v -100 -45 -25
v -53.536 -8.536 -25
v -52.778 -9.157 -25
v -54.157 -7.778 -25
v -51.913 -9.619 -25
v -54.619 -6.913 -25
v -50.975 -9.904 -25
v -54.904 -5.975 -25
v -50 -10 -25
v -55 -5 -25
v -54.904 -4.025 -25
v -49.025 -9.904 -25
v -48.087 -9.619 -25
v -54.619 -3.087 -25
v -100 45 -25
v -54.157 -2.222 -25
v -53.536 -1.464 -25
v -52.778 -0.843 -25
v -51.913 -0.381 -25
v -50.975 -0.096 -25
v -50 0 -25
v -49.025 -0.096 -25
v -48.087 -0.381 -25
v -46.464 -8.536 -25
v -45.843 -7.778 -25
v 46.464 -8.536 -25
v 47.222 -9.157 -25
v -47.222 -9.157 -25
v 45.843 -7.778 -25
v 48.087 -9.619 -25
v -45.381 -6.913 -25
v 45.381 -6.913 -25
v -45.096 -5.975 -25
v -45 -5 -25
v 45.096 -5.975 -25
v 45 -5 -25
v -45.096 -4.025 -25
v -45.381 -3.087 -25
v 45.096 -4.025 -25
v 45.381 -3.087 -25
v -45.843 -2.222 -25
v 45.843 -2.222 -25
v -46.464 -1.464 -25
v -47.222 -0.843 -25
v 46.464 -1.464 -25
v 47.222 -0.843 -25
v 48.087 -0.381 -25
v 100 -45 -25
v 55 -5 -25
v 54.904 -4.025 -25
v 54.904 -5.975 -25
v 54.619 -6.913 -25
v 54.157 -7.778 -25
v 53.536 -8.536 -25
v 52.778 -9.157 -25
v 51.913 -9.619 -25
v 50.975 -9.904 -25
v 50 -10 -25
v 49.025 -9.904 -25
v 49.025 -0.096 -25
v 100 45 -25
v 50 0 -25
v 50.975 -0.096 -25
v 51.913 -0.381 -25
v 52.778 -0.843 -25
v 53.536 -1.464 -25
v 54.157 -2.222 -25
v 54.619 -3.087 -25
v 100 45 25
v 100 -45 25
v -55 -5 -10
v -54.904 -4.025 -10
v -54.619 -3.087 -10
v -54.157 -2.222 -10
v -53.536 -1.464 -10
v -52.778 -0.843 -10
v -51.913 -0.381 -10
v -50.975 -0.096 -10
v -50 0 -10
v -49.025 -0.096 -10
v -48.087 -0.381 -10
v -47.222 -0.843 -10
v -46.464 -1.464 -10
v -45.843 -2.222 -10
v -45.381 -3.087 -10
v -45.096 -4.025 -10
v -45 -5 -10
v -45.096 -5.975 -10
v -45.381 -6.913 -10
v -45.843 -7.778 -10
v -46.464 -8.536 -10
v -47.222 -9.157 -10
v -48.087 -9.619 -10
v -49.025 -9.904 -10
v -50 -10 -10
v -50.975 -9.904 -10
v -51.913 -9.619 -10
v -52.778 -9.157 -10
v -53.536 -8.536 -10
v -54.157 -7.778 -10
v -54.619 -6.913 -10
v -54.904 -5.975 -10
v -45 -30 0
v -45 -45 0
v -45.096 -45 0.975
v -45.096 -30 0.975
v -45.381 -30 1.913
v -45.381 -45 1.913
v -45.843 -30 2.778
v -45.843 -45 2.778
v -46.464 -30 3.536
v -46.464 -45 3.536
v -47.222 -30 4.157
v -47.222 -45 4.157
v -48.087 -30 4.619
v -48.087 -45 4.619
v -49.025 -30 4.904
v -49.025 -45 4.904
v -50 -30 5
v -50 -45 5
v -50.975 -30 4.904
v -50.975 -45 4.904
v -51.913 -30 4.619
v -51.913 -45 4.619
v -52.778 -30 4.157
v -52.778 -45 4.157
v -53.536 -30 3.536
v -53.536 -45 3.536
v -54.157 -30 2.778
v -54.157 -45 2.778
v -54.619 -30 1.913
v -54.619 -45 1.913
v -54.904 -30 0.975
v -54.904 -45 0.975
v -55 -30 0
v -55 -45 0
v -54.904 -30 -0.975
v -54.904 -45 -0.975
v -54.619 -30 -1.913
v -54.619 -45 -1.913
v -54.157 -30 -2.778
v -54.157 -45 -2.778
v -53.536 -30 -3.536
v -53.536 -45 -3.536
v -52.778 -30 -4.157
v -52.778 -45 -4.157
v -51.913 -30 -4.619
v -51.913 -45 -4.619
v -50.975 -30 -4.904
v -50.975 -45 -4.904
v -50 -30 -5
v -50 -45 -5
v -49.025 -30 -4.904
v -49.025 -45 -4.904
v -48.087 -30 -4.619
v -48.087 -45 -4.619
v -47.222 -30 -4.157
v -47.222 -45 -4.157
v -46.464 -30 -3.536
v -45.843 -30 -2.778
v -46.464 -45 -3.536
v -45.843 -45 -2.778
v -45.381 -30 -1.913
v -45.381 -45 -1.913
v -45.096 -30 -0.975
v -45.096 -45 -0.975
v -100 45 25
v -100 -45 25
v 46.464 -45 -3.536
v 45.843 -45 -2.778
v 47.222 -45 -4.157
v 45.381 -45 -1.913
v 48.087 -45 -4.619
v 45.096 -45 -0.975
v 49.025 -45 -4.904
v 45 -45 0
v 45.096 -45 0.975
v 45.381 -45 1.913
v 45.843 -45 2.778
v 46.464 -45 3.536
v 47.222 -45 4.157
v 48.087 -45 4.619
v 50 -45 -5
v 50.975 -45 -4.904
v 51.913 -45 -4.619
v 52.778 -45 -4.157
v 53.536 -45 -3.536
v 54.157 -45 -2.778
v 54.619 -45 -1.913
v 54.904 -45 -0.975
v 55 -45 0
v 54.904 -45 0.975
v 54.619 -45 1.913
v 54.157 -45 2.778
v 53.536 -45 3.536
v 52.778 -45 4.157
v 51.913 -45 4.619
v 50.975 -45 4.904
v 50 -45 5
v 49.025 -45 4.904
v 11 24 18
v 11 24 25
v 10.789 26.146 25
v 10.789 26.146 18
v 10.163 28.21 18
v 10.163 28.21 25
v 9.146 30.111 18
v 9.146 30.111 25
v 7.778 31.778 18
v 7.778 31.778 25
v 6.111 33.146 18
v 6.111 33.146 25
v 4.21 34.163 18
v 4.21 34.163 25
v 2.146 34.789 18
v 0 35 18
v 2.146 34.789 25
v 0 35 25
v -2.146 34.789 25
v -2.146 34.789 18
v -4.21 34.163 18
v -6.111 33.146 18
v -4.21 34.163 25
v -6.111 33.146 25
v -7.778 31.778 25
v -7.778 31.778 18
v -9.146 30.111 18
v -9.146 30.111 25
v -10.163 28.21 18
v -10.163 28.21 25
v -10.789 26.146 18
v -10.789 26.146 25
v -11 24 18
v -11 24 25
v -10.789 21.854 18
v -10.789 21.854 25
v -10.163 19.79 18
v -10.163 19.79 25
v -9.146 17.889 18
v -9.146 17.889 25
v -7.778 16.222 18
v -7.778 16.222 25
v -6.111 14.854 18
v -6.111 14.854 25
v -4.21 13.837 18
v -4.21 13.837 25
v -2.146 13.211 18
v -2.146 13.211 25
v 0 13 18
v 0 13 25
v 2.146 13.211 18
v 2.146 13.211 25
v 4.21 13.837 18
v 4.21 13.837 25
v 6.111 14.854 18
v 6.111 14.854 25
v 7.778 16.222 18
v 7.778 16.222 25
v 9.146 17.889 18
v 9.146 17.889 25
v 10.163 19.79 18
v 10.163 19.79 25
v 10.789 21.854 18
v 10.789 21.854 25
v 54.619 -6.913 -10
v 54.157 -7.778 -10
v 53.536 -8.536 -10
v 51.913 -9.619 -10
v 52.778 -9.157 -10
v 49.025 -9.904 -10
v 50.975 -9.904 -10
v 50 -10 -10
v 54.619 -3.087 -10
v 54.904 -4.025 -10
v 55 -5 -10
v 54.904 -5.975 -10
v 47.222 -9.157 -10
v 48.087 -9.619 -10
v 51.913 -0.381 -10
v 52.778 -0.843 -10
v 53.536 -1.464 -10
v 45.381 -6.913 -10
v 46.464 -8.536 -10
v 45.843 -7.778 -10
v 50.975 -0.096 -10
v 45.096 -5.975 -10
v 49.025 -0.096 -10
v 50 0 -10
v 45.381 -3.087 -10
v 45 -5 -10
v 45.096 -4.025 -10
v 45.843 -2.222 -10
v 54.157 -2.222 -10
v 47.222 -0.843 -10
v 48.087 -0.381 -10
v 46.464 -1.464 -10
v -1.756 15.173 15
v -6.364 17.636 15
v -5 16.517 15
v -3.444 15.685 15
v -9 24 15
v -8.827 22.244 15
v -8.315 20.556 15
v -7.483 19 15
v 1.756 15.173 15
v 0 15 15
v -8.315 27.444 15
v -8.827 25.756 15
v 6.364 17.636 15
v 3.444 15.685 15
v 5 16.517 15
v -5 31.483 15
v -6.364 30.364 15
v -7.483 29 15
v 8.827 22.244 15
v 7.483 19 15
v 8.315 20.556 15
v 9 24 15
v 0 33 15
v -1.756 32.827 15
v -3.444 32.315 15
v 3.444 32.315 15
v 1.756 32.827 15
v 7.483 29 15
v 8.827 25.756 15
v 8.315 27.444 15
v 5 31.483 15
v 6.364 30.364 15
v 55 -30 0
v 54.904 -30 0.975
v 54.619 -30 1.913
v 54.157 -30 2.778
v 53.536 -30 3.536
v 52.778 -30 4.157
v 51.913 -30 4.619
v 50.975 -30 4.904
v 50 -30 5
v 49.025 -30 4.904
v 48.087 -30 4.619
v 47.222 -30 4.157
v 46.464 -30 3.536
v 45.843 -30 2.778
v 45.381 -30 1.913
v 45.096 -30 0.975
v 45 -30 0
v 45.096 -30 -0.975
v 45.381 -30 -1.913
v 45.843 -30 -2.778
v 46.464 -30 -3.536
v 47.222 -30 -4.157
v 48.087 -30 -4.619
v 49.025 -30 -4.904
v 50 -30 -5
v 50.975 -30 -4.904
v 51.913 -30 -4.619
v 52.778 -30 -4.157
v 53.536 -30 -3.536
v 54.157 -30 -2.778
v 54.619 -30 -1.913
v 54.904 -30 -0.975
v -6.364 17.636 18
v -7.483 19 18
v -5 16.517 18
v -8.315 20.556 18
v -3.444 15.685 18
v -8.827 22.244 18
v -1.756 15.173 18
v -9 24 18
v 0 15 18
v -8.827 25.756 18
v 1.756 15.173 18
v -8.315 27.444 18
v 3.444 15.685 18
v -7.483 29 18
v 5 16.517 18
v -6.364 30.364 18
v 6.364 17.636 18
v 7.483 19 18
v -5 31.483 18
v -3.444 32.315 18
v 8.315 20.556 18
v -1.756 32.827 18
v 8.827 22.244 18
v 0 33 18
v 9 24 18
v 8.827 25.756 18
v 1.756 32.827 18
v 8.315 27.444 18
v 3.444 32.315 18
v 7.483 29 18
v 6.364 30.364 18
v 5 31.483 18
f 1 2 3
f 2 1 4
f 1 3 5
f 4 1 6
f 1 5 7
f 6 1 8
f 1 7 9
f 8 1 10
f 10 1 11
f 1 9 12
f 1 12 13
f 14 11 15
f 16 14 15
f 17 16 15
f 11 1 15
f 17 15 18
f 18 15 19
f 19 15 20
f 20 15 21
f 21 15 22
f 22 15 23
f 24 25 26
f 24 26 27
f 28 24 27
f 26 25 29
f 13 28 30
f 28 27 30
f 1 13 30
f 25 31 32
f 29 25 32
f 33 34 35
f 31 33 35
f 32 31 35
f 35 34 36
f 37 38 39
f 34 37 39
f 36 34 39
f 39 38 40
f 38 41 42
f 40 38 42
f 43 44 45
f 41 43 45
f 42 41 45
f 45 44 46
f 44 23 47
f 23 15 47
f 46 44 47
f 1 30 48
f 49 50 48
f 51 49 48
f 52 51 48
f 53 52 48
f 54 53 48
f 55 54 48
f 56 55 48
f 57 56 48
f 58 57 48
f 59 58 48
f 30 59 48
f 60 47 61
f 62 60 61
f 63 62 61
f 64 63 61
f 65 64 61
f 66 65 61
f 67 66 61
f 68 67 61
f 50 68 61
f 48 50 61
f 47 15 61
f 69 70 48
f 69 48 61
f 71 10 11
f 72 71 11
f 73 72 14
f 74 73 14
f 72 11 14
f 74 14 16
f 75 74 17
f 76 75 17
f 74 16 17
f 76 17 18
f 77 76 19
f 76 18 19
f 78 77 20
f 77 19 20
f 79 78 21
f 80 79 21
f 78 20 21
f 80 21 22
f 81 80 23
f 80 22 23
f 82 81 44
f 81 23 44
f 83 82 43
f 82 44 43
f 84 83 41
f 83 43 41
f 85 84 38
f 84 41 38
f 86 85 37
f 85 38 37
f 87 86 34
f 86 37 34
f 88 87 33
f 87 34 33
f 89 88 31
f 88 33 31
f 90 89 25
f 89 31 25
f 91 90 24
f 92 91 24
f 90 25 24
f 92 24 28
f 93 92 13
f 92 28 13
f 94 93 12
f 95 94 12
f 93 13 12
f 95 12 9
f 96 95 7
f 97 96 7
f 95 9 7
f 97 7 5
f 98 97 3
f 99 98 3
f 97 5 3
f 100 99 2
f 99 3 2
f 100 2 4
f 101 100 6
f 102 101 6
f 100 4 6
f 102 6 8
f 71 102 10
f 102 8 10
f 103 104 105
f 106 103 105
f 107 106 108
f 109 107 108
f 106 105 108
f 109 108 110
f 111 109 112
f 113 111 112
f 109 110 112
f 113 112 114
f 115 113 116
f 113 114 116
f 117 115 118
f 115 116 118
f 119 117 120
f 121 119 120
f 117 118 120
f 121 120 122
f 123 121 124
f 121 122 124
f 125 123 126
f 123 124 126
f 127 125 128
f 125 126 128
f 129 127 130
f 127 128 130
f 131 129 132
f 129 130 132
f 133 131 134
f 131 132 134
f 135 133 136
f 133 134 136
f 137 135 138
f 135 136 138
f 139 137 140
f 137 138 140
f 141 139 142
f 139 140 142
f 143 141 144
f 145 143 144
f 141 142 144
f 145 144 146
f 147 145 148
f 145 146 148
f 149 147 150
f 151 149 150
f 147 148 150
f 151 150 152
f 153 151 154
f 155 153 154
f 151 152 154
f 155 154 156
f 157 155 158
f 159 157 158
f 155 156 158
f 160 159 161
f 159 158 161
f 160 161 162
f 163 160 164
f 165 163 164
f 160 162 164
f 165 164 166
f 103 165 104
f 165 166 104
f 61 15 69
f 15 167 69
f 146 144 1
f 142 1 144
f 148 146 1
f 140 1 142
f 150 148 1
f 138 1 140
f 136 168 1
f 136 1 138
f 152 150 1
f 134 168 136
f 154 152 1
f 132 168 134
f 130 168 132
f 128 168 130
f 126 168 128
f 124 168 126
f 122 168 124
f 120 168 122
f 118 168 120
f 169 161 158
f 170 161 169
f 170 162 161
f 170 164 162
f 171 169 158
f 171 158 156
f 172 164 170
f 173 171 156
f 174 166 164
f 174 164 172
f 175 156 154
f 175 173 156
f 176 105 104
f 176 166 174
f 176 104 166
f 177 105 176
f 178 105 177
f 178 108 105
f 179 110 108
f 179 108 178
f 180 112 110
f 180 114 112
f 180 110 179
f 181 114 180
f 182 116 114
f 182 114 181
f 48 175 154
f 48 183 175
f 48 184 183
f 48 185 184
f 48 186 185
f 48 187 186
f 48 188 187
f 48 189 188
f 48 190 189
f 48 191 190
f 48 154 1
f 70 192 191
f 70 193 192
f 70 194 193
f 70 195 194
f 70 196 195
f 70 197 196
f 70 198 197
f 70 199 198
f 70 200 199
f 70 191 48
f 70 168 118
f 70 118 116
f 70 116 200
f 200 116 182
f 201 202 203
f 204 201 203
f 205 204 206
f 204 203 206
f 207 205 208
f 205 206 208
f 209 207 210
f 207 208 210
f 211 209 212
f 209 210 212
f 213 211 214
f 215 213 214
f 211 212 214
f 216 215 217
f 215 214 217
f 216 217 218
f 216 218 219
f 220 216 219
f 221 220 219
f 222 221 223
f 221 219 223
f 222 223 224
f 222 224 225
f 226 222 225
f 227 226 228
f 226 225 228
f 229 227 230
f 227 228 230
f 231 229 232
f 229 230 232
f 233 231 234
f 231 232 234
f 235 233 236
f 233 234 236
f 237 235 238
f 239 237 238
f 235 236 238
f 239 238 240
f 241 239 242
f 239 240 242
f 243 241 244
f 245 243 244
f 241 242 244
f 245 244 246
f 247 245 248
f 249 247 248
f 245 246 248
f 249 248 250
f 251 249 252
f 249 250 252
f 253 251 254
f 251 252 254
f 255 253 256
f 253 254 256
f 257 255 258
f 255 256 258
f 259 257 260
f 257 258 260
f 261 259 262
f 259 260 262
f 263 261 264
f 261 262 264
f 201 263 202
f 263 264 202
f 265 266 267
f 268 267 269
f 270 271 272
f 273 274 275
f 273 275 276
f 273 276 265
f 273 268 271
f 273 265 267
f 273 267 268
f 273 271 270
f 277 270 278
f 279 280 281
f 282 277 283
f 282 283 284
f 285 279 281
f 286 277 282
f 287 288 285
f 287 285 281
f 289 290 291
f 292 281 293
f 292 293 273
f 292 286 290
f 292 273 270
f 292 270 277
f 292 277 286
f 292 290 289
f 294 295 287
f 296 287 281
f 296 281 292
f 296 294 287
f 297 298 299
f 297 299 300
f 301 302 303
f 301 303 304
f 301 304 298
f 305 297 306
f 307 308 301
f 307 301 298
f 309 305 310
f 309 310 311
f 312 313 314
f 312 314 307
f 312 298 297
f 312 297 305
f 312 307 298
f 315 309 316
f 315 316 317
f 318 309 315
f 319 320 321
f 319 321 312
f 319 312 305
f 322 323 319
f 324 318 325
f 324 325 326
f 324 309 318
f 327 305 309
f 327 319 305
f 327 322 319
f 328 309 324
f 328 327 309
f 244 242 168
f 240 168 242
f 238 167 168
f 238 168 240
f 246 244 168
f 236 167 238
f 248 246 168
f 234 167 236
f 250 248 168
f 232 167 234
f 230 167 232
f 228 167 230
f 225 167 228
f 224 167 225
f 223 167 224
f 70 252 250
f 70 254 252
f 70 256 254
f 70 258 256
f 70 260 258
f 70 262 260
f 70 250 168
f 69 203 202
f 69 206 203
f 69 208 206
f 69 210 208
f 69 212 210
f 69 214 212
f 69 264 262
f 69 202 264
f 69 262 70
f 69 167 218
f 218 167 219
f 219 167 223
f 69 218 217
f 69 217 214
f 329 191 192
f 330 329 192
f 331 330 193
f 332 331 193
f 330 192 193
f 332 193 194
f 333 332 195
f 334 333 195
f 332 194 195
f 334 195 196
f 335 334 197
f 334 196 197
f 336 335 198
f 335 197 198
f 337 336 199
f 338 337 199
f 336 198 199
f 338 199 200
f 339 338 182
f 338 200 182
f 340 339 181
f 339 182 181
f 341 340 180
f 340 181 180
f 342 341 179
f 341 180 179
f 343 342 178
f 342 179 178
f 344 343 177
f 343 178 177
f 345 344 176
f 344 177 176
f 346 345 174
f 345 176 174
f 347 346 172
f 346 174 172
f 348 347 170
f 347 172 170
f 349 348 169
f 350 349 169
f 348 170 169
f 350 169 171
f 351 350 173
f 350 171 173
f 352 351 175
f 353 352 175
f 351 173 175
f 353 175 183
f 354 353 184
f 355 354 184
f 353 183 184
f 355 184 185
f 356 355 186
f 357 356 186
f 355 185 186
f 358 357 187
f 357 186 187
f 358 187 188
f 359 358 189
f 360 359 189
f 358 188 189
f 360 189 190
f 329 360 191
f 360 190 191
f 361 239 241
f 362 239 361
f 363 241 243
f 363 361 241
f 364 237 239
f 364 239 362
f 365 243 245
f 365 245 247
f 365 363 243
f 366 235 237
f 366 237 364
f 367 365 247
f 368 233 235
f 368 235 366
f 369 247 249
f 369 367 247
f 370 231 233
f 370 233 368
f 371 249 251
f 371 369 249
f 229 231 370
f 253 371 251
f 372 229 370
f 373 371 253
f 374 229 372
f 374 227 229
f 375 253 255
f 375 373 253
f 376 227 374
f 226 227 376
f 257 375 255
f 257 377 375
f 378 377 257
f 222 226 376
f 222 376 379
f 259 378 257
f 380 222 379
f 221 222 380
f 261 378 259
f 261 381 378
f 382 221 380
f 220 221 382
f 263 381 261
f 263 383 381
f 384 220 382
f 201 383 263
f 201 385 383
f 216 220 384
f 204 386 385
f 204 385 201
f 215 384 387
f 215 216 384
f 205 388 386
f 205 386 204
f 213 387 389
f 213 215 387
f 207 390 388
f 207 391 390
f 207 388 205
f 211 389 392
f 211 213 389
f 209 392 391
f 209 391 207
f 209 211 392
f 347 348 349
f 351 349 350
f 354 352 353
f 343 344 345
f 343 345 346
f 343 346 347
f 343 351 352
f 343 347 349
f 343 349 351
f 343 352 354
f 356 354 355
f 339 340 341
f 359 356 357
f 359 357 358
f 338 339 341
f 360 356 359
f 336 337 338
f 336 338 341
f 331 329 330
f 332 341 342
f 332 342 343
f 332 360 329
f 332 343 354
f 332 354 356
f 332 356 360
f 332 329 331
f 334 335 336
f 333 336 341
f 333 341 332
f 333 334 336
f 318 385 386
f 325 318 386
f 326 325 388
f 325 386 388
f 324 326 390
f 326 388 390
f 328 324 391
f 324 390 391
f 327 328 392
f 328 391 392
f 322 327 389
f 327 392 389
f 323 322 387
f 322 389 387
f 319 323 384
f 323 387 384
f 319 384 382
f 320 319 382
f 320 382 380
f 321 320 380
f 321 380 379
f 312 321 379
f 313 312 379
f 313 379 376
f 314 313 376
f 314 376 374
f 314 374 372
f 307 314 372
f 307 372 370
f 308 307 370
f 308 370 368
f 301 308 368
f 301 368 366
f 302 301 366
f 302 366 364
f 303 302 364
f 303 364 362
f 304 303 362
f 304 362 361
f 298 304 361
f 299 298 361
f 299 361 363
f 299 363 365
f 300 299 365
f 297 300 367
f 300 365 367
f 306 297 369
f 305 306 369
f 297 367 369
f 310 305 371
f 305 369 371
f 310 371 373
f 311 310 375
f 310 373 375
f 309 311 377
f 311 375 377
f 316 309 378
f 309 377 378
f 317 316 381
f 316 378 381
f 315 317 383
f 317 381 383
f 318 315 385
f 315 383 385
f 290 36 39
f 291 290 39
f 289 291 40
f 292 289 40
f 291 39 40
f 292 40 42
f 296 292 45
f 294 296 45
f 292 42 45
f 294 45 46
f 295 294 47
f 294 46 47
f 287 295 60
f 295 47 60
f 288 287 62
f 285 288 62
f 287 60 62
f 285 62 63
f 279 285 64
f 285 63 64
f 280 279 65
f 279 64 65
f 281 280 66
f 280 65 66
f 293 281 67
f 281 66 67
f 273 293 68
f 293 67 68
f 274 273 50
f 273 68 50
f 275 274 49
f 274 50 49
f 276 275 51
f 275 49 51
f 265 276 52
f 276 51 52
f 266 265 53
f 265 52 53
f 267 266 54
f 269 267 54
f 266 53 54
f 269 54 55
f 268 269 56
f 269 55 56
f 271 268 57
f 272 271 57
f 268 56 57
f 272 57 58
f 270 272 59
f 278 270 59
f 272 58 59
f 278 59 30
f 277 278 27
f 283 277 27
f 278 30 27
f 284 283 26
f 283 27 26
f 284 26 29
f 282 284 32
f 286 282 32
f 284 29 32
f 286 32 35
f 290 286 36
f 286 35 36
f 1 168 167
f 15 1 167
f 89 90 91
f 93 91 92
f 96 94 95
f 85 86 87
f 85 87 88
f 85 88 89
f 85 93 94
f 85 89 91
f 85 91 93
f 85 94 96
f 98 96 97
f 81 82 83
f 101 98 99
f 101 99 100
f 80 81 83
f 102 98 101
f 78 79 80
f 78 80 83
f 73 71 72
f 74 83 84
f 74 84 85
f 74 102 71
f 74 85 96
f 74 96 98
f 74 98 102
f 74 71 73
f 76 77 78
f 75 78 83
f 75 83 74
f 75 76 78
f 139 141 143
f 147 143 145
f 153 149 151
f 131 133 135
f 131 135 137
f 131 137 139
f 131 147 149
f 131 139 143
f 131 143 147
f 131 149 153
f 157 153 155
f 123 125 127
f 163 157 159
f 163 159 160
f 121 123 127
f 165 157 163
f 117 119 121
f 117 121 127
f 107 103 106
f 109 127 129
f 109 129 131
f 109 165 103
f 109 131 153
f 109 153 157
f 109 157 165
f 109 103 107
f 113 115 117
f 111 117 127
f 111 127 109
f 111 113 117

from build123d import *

# Parameters (mm, degrees)
SKETCH1_W           = 200
SKETCH1_H           = 90
BOSS_EXTRUDE1_DEPTH = 25
SKETCH2_R           = 9
CUT_EXTRUDE1_DEPTH  = 10
SKETCH2_4_R         = 11
SKETCH2_4_R_2       = 9
CUT_EXTRUDE2_DEPTH  = 7
SKETCH3_R           = 5
CUT_EXTRUDE3_DEPTH  = 15
SKETCH4_R           = 5
CUT_EXTRUDE4_DEPTH  = 15


with BuildPart() as part:
    # Sketch1 → Boss-Extrude1 (new, symmetric)
    with BuildSketch(Plane.XY):
        Rectangle(SKETCH1_W, SKETCH1_H)
    extrude(amount=BOSS_EXTRUDE1_DEPTH, both=True)

    # Sketch2 → Cut-Extrude1 (cut)
    with BuildSketch(Plane.XY.offset(25)):
        with Locations((0, 24)):
            Circle(SKETCH2_R)
    extrude(amount=-CUT_EXTRUDE1_DEPTH, mode=Mode.SUBTRACT)

    # Sketch2<4> → Cut-Extrude2 (cut)
    with BuildSketch(Plane.XY.offset(25)):
        with Locations((0, 24)):
            Circle(SKETCH2_4_R)
        with Locations((0, 24)):
            Circle(SKETCH2_4_R_2, mode=Mode.SUBTRACT)
    extrude(amount=-CUT_EXTRUDE2_DEPTH, mode=Mode.SUBTRACT)

    # Sketch3 → Cut-Extrude3 (cut)
    with BuildSketch(Plane.XZ.offset(45)):
        with Locations((-50, 0)):
            Circle(SKETCH3_R)
        with Locations((50, 0)):
            Circle(SKETCH3_R)
    extrude(amount=-CUT_EXTRUDE3_DEPTH, mode=Mode.SUBTRACT)

    # Sketch4 → Cut-Extrude4 (cut)
    with BuildSketch(Plane(origin=(0, 0, -25), x_dir=(-1, 0, 0), z_dir=(0, 0, -1))):
        with Locations((-50, -5)):
            Circle(SKETCH4_R)
        with Locations((50, -5)):
            Circle(SKETCH4_R)
    extrude(amount=-CUT_EXTRUDE4_DEPTH, mode=Mode.SUBTRACT)


solid = part.part
